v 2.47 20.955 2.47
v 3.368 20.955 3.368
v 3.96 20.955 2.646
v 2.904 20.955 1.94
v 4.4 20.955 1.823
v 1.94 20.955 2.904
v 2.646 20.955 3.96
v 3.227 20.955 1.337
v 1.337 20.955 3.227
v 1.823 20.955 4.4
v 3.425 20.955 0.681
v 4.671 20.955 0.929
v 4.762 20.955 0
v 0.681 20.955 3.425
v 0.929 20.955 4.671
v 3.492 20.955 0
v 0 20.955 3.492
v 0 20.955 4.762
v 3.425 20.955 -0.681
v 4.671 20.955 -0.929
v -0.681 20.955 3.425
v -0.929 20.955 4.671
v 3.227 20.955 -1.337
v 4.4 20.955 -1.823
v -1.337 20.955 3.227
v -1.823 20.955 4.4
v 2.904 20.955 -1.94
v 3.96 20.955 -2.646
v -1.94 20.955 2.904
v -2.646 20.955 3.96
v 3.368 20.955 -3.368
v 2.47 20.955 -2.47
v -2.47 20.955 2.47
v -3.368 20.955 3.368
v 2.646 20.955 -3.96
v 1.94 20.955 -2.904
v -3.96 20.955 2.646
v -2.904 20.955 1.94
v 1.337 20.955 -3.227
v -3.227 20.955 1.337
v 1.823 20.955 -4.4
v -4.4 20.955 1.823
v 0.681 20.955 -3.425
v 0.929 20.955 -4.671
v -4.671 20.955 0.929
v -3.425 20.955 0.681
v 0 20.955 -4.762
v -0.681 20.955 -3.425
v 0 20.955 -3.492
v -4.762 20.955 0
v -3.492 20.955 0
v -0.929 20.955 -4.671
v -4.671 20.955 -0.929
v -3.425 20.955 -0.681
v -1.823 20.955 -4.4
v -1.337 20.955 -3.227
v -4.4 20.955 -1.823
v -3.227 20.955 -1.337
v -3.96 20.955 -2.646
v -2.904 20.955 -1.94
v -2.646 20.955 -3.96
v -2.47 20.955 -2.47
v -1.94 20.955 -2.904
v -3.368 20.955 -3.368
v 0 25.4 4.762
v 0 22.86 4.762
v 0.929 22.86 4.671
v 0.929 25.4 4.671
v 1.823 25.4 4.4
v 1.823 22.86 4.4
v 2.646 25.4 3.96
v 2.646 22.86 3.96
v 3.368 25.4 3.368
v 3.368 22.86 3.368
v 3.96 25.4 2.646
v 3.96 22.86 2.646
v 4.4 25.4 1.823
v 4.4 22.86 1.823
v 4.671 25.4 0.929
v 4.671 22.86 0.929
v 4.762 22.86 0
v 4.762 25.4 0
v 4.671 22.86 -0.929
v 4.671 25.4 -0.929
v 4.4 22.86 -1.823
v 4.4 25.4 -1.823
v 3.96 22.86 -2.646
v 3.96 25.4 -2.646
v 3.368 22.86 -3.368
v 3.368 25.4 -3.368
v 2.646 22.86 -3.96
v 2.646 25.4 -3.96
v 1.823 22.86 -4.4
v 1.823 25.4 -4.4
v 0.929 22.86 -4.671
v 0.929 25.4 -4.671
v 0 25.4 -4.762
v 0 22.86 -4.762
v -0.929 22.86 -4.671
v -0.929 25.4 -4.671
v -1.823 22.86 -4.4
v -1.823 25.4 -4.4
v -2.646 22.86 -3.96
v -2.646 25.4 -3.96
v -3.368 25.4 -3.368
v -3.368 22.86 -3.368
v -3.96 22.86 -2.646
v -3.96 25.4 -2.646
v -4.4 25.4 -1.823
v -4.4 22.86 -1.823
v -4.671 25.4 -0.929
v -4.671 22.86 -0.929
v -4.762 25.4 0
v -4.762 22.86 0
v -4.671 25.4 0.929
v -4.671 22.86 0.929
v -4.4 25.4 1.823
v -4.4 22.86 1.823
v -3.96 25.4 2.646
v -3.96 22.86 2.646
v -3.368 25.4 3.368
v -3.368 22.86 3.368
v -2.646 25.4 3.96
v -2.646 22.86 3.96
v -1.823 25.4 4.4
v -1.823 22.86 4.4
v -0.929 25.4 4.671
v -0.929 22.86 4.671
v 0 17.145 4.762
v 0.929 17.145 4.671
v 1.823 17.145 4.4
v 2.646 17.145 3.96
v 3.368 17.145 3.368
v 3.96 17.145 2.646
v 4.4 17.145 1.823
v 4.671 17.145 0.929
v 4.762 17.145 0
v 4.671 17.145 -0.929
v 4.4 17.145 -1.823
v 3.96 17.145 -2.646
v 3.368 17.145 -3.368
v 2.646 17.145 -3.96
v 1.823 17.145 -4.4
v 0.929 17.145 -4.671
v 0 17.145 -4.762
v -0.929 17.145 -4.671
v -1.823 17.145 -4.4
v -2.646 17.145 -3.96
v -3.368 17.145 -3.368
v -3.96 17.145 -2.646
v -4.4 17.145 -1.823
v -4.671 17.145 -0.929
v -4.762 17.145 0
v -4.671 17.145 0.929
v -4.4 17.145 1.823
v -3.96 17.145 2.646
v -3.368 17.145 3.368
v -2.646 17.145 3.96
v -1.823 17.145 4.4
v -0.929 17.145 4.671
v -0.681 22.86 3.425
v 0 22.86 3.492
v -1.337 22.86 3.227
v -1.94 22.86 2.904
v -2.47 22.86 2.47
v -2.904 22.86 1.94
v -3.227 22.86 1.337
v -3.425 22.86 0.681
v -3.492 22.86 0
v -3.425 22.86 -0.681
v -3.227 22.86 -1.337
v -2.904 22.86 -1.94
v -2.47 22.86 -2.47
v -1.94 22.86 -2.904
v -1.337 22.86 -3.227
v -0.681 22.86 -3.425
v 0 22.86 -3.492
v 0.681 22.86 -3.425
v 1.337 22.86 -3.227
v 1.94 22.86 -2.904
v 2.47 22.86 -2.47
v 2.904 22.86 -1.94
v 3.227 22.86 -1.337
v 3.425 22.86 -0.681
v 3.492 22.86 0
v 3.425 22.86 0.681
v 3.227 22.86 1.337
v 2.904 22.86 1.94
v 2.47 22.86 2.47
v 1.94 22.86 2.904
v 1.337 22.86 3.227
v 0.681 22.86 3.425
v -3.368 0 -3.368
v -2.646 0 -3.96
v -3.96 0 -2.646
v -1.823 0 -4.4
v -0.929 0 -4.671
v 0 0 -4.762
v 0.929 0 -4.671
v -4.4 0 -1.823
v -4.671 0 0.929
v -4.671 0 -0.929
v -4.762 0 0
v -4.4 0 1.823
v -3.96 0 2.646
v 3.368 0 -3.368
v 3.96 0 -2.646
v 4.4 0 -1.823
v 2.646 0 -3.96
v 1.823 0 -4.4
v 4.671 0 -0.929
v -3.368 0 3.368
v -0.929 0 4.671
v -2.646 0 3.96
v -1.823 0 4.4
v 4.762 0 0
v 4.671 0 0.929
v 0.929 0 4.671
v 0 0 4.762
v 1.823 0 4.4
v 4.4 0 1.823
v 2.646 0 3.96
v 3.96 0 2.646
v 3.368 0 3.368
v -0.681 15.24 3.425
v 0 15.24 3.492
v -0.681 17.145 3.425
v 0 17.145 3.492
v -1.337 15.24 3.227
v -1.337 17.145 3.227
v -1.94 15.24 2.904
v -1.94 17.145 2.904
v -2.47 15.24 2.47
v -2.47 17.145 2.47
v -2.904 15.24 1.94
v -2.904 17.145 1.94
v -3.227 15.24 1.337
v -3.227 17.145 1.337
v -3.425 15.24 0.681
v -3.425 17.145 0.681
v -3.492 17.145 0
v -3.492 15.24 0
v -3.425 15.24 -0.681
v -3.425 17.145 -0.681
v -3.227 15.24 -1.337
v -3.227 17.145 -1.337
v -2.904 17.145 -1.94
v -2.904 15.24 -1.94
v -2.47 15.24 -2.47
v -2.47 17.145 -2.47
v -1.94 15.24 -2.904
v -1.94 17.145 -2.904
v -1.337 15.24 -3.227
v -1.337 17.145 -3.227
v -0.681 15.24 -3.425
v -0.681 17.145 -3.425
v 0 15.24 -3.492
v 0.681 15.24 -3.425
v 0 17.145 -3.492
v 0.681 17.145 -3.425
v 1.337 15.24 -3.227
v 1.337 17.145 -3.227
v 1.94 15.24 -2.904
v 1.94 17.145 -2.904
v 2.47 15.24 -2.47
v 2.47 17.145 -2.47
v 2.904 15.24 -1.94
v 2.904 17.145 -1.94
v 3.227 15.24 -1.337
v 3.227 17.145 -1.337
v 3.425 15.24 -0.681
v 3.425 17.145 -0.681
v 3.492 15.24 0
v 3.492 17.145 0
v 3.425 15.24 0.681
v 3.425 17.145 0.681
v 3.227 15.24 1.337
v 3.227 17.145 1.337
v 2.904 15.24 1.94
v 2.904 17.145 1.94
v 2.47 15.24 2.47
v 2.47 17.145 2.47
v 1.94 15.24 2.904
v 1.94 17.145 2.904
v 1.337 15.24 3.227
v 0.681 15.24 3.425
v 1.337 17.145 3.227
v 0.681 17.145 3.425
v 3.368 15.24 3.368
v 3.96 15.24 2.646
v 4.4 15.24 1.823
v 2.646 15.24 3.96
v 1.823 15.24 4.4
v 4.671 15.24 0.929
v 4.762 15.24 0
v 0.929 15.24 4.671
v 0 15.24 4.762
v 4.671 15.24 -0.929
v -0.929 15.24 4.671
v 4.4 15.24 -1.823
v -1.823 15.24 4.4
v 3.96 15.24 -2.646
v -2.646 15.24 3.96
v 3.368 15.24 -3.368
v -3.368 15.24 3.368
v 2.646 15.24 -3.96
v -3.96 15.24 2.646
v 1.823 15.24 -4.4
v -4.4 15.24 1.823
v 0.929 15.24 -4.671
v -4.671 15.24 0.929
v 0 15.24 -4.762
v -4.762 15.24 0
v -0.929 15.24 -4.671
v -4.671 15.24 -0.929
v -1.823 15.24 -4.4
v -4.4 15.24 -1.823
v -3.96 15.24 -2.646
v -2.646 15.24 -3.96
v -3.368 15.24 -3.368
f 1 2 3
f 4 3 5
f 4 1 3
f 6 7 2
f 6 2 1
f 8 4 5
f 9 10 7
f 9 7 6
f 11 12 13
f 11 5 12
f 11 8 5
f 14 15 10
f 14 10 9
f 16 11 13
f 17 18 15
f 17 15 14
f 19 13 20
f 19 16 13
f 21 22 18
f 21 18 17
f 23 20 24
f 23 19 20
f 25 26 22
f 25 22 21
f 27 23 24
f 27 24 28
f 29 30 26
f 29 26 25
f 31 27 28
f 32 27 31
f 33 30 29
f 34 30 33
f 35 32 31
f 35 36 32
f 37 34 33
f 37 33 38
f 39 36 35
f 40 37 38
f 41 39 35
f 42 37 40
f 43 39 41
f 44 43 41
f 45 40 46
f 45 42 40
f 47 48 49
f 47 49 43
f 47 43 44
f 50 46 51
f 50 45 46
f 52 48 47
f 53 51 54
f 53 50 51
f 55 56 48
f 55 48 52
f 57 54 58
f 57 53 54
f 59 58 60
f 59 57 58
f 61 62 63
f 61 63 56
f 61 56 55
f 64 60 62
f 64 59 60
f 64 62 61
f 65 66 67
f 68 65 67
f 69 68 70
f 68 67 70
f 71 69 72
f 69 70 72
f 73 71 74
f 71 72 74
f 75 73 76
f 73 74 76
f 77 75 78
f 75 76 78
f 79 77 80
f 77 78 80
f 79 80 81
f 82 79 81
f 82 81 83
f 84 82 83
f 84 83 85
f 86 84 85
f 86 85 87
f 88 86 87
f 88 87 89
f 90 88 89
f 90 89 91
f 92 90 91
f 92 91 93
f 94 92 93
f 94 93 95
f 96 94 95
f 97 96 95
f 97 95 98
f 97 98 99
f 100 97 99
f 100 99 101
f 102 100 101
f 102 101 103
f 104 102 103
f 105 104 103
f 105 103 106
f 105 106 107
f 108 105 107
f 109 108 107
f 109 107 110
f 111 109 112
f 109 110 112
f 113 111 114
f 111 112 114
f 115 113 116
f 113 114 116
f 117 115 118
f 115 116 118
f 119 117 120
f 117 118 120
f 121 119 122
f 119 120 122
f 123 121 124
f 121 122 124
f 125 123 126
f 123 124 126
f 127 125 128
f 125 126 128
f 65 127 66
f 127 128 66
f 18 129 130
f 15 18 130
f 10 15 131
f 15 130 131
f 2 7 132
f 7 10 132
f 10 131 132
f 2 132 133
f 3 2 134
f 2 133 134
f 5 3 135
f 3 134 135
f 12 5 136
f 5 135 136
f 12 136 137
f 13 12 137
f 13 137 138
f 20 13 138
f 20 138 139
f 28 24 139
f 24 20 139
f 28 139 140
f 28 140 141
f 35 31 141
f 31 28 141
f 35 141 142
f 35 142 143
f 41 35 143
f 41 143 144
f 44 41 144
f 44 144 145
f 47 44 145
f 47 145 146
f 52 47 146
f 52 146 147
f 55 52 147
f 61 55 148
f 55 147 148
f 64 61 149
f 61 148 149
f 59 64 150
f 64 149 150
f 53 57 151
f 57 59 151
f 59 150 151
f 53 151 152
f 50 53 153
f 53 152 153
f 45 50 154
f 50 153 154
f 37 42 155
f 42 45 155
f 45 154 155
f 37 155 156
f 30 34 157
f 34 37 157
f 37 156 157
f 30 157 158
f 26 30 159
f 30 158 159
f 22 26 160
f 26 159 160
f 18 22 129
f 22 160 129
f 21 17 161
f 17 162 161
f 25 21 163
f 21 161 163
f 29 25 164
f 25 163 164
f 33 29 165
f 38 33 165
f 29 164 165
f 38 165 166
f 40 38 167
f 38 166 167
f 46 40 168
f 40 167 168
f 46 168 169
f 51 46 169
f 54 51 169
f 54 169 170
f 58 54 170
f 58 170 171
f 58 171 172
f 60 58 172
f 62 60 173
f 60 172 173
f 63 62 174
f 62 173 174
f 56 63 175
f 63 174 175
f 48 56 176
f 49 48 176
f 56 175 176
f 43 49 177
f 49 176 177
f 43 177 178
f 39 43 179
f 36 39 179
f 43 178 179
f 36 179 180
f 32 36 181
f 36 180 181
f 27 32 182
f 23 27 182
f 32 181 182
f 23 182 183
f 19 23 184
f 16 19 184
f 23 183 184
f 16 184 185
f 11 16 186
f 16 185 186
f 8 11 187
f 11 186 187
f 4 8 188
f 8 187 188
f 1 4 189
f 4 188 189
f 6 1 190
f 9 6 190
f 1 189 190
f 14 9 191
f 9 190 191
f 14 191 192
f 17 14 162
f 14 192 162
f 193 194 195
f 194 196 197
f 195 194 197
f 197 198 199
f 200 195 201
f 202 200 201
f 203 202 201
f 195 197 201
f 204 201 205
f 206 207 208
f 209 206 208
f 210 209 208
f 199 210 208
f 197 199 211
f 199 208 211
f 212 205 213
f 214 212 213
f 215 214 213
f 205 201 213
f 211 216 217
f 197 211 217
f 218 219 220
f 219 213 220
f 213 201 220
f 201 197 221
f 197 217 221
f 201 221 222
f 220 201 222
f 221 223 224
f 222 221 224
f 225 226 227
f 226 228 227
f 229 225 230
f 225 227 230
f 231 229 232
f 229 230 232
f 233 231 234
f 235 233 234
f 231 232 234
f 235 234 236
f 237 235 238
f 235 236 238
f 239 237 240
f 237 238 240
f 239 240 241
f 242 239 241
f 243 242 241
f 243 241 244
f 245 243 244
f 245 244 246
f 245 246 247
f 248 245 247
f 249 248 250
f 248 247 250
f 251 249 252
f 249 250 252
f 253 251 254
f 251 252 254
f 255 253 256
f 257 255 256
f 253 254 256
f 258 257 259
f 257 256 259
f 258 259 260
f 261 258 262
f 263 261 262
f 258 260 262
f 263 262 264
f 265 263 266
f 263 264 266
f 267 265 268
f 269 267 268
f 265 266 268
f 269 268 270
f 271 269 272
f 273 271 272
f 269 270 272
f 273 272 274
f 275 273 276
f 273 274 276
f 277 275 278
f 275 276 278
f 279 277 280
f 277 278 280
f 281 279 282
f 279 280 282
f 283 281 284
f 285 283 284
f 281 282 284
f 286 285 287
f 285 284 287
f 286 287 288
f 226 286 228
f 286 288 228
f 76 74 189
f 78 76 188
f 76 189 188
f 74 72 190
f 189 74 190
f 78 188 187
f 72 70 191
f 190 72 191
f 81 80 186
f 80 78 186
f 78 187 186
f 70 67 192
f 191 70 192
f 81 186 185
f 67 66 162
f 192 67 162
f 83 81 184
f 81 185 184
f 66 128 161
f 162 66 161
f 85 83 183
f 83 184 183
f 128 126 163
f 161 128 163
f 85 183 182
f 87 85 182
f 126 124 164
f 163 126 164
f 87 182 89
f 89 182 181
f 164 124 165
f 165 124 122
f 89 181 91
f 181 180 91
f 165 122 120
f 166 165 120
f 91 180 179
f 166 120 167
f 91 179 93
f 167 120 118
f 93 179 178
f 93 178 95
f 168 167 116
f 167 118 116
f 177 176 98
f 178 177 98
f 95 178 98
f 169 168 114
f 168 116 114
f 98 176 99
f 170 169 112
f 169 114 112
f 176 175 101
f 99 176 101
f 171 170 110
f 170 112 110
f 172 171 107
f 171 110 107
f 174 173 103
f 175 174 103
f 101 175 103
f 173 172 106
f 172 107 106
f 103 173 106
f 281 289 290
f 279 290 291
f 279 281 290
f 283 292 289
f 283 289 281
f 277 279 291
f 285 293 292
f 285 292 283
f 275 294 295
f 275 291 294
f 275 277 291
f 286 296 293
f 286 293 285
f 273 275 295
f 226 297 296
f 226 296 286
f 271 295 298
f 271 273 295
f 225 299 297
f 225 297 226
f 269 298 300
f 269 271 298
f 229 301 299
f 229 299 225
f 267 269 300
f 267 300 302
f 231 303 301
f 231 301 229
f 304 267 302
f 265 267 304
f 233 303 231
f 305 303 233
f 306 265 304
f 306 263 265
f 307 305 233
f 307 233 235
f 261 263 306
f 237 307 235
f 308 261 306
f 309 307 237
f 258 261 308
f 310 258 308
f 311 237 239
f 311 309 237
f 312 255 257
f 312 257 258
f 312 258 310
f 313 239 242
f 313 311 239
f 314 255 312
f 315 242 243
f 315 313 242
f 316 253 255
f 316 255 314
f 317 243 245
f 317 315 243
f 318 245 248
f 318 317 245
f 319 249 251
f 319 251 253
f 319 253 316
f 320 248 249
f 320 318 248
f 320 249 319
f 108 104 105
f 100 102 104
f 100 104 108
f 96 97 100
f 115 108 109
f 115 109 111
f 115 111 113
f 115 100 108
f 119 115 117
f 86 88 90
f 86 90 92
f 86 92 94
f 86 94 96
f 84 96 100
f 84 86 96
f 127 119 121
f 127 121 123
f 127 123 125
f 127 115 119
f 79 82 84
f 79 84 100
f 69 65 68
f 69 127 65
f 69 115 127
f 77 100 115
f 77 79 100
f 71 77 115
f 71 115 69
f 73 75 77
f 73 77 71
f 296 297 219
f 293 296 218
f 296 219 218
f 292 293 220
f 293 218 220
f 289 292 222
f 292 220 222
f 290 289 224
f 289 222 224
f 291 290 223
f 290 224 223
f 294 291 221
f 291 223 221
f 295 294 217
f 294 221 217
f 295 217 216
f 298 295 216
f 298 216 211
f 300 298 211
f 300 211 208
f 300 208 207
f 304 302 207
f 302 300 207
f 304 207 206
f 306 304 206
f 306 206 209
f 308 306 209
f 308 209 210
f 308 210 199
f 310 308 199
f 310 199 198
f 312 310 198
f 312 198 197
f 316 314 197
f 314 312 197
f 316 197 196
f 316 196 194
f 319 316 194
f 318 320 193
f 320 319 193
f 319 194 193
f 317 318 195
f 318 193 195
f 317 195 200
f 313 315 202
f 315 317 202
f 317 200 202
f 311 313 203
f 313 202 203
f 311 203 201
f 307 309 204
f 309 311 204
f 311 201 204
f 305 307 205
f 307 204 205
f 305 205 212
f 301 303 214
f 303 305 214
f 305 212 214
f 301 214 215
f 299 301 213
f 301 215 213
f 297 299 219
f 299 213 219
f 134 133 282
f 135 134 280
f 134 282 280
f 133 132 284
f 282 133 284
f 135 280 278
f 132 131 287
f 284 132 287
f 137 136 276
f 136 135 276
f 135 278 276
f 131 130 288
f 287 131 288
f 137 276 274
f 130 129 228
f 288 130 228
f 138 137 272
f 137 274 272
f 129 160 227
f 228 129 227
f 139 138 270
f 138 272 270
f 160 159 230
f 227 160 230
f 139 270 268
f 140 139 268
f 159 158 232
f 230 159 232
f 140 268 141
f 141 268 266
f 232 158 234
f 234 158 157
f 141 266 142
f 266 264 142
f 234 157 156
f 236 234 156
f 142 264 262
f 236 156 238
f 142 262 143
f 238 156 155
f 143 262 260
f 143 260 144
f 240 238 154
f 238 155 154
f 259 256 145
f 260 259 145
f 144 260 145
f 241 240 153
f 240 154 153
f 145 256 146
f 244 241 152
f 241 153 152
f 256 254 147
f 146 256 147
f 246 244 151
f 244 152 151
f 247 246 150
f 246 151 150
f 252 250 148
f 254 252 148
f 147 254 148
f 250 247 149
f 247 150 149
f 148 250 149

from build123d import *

# Parameters (mm, degrees)
SKETCH1_R           = 4.7625
BOSS_EXTRUDE1_DEPTH = 25.4
SKETCH2_W           = 2.54
SKETCH2_H           = 1.905


with BuildPart() as part:
    # Sketch1 → Boss-Extrude1 (new body)
    with BuildSketch(Plane(origin=(0, 0, 0), x_dir=(1, 0, 0), z_dir=(0, 1, 0))):
        with Locations(Location((0, 0, 0), (0, 0, 270))):
            Circle(SKETCH1_R)
    extrude(amount=BOSS_EXTRUDE1_DEPTH)

    # Sketch2 → Cut-Revolve1 (revolve, cut)
    with BuildSketch(Plane(origin=(0, 0, 0), x_dir=(0, 0, -1), z_dir=(1, 0, 0)), mode=Mode.PRIVATE) as cut_revolve1_sk:
        with Locations((4.7625, 21.9075)):
            Rectangle(SKETCH2_W, SKETCH2_H)
        with Locations((4.7625, 16.1925)):
            Rectangle(SKETCH2_W, SKETCH2_H)
    revolve(cut_revolve1_sk.sketch.rotate(Axis((0, 25.4, 0), (0, -1, 0)), 180), axis=Axis((0, 25.4, 0), (0, -1, 0)), mode=Mode.SUBTRACT)


solid = part.part
